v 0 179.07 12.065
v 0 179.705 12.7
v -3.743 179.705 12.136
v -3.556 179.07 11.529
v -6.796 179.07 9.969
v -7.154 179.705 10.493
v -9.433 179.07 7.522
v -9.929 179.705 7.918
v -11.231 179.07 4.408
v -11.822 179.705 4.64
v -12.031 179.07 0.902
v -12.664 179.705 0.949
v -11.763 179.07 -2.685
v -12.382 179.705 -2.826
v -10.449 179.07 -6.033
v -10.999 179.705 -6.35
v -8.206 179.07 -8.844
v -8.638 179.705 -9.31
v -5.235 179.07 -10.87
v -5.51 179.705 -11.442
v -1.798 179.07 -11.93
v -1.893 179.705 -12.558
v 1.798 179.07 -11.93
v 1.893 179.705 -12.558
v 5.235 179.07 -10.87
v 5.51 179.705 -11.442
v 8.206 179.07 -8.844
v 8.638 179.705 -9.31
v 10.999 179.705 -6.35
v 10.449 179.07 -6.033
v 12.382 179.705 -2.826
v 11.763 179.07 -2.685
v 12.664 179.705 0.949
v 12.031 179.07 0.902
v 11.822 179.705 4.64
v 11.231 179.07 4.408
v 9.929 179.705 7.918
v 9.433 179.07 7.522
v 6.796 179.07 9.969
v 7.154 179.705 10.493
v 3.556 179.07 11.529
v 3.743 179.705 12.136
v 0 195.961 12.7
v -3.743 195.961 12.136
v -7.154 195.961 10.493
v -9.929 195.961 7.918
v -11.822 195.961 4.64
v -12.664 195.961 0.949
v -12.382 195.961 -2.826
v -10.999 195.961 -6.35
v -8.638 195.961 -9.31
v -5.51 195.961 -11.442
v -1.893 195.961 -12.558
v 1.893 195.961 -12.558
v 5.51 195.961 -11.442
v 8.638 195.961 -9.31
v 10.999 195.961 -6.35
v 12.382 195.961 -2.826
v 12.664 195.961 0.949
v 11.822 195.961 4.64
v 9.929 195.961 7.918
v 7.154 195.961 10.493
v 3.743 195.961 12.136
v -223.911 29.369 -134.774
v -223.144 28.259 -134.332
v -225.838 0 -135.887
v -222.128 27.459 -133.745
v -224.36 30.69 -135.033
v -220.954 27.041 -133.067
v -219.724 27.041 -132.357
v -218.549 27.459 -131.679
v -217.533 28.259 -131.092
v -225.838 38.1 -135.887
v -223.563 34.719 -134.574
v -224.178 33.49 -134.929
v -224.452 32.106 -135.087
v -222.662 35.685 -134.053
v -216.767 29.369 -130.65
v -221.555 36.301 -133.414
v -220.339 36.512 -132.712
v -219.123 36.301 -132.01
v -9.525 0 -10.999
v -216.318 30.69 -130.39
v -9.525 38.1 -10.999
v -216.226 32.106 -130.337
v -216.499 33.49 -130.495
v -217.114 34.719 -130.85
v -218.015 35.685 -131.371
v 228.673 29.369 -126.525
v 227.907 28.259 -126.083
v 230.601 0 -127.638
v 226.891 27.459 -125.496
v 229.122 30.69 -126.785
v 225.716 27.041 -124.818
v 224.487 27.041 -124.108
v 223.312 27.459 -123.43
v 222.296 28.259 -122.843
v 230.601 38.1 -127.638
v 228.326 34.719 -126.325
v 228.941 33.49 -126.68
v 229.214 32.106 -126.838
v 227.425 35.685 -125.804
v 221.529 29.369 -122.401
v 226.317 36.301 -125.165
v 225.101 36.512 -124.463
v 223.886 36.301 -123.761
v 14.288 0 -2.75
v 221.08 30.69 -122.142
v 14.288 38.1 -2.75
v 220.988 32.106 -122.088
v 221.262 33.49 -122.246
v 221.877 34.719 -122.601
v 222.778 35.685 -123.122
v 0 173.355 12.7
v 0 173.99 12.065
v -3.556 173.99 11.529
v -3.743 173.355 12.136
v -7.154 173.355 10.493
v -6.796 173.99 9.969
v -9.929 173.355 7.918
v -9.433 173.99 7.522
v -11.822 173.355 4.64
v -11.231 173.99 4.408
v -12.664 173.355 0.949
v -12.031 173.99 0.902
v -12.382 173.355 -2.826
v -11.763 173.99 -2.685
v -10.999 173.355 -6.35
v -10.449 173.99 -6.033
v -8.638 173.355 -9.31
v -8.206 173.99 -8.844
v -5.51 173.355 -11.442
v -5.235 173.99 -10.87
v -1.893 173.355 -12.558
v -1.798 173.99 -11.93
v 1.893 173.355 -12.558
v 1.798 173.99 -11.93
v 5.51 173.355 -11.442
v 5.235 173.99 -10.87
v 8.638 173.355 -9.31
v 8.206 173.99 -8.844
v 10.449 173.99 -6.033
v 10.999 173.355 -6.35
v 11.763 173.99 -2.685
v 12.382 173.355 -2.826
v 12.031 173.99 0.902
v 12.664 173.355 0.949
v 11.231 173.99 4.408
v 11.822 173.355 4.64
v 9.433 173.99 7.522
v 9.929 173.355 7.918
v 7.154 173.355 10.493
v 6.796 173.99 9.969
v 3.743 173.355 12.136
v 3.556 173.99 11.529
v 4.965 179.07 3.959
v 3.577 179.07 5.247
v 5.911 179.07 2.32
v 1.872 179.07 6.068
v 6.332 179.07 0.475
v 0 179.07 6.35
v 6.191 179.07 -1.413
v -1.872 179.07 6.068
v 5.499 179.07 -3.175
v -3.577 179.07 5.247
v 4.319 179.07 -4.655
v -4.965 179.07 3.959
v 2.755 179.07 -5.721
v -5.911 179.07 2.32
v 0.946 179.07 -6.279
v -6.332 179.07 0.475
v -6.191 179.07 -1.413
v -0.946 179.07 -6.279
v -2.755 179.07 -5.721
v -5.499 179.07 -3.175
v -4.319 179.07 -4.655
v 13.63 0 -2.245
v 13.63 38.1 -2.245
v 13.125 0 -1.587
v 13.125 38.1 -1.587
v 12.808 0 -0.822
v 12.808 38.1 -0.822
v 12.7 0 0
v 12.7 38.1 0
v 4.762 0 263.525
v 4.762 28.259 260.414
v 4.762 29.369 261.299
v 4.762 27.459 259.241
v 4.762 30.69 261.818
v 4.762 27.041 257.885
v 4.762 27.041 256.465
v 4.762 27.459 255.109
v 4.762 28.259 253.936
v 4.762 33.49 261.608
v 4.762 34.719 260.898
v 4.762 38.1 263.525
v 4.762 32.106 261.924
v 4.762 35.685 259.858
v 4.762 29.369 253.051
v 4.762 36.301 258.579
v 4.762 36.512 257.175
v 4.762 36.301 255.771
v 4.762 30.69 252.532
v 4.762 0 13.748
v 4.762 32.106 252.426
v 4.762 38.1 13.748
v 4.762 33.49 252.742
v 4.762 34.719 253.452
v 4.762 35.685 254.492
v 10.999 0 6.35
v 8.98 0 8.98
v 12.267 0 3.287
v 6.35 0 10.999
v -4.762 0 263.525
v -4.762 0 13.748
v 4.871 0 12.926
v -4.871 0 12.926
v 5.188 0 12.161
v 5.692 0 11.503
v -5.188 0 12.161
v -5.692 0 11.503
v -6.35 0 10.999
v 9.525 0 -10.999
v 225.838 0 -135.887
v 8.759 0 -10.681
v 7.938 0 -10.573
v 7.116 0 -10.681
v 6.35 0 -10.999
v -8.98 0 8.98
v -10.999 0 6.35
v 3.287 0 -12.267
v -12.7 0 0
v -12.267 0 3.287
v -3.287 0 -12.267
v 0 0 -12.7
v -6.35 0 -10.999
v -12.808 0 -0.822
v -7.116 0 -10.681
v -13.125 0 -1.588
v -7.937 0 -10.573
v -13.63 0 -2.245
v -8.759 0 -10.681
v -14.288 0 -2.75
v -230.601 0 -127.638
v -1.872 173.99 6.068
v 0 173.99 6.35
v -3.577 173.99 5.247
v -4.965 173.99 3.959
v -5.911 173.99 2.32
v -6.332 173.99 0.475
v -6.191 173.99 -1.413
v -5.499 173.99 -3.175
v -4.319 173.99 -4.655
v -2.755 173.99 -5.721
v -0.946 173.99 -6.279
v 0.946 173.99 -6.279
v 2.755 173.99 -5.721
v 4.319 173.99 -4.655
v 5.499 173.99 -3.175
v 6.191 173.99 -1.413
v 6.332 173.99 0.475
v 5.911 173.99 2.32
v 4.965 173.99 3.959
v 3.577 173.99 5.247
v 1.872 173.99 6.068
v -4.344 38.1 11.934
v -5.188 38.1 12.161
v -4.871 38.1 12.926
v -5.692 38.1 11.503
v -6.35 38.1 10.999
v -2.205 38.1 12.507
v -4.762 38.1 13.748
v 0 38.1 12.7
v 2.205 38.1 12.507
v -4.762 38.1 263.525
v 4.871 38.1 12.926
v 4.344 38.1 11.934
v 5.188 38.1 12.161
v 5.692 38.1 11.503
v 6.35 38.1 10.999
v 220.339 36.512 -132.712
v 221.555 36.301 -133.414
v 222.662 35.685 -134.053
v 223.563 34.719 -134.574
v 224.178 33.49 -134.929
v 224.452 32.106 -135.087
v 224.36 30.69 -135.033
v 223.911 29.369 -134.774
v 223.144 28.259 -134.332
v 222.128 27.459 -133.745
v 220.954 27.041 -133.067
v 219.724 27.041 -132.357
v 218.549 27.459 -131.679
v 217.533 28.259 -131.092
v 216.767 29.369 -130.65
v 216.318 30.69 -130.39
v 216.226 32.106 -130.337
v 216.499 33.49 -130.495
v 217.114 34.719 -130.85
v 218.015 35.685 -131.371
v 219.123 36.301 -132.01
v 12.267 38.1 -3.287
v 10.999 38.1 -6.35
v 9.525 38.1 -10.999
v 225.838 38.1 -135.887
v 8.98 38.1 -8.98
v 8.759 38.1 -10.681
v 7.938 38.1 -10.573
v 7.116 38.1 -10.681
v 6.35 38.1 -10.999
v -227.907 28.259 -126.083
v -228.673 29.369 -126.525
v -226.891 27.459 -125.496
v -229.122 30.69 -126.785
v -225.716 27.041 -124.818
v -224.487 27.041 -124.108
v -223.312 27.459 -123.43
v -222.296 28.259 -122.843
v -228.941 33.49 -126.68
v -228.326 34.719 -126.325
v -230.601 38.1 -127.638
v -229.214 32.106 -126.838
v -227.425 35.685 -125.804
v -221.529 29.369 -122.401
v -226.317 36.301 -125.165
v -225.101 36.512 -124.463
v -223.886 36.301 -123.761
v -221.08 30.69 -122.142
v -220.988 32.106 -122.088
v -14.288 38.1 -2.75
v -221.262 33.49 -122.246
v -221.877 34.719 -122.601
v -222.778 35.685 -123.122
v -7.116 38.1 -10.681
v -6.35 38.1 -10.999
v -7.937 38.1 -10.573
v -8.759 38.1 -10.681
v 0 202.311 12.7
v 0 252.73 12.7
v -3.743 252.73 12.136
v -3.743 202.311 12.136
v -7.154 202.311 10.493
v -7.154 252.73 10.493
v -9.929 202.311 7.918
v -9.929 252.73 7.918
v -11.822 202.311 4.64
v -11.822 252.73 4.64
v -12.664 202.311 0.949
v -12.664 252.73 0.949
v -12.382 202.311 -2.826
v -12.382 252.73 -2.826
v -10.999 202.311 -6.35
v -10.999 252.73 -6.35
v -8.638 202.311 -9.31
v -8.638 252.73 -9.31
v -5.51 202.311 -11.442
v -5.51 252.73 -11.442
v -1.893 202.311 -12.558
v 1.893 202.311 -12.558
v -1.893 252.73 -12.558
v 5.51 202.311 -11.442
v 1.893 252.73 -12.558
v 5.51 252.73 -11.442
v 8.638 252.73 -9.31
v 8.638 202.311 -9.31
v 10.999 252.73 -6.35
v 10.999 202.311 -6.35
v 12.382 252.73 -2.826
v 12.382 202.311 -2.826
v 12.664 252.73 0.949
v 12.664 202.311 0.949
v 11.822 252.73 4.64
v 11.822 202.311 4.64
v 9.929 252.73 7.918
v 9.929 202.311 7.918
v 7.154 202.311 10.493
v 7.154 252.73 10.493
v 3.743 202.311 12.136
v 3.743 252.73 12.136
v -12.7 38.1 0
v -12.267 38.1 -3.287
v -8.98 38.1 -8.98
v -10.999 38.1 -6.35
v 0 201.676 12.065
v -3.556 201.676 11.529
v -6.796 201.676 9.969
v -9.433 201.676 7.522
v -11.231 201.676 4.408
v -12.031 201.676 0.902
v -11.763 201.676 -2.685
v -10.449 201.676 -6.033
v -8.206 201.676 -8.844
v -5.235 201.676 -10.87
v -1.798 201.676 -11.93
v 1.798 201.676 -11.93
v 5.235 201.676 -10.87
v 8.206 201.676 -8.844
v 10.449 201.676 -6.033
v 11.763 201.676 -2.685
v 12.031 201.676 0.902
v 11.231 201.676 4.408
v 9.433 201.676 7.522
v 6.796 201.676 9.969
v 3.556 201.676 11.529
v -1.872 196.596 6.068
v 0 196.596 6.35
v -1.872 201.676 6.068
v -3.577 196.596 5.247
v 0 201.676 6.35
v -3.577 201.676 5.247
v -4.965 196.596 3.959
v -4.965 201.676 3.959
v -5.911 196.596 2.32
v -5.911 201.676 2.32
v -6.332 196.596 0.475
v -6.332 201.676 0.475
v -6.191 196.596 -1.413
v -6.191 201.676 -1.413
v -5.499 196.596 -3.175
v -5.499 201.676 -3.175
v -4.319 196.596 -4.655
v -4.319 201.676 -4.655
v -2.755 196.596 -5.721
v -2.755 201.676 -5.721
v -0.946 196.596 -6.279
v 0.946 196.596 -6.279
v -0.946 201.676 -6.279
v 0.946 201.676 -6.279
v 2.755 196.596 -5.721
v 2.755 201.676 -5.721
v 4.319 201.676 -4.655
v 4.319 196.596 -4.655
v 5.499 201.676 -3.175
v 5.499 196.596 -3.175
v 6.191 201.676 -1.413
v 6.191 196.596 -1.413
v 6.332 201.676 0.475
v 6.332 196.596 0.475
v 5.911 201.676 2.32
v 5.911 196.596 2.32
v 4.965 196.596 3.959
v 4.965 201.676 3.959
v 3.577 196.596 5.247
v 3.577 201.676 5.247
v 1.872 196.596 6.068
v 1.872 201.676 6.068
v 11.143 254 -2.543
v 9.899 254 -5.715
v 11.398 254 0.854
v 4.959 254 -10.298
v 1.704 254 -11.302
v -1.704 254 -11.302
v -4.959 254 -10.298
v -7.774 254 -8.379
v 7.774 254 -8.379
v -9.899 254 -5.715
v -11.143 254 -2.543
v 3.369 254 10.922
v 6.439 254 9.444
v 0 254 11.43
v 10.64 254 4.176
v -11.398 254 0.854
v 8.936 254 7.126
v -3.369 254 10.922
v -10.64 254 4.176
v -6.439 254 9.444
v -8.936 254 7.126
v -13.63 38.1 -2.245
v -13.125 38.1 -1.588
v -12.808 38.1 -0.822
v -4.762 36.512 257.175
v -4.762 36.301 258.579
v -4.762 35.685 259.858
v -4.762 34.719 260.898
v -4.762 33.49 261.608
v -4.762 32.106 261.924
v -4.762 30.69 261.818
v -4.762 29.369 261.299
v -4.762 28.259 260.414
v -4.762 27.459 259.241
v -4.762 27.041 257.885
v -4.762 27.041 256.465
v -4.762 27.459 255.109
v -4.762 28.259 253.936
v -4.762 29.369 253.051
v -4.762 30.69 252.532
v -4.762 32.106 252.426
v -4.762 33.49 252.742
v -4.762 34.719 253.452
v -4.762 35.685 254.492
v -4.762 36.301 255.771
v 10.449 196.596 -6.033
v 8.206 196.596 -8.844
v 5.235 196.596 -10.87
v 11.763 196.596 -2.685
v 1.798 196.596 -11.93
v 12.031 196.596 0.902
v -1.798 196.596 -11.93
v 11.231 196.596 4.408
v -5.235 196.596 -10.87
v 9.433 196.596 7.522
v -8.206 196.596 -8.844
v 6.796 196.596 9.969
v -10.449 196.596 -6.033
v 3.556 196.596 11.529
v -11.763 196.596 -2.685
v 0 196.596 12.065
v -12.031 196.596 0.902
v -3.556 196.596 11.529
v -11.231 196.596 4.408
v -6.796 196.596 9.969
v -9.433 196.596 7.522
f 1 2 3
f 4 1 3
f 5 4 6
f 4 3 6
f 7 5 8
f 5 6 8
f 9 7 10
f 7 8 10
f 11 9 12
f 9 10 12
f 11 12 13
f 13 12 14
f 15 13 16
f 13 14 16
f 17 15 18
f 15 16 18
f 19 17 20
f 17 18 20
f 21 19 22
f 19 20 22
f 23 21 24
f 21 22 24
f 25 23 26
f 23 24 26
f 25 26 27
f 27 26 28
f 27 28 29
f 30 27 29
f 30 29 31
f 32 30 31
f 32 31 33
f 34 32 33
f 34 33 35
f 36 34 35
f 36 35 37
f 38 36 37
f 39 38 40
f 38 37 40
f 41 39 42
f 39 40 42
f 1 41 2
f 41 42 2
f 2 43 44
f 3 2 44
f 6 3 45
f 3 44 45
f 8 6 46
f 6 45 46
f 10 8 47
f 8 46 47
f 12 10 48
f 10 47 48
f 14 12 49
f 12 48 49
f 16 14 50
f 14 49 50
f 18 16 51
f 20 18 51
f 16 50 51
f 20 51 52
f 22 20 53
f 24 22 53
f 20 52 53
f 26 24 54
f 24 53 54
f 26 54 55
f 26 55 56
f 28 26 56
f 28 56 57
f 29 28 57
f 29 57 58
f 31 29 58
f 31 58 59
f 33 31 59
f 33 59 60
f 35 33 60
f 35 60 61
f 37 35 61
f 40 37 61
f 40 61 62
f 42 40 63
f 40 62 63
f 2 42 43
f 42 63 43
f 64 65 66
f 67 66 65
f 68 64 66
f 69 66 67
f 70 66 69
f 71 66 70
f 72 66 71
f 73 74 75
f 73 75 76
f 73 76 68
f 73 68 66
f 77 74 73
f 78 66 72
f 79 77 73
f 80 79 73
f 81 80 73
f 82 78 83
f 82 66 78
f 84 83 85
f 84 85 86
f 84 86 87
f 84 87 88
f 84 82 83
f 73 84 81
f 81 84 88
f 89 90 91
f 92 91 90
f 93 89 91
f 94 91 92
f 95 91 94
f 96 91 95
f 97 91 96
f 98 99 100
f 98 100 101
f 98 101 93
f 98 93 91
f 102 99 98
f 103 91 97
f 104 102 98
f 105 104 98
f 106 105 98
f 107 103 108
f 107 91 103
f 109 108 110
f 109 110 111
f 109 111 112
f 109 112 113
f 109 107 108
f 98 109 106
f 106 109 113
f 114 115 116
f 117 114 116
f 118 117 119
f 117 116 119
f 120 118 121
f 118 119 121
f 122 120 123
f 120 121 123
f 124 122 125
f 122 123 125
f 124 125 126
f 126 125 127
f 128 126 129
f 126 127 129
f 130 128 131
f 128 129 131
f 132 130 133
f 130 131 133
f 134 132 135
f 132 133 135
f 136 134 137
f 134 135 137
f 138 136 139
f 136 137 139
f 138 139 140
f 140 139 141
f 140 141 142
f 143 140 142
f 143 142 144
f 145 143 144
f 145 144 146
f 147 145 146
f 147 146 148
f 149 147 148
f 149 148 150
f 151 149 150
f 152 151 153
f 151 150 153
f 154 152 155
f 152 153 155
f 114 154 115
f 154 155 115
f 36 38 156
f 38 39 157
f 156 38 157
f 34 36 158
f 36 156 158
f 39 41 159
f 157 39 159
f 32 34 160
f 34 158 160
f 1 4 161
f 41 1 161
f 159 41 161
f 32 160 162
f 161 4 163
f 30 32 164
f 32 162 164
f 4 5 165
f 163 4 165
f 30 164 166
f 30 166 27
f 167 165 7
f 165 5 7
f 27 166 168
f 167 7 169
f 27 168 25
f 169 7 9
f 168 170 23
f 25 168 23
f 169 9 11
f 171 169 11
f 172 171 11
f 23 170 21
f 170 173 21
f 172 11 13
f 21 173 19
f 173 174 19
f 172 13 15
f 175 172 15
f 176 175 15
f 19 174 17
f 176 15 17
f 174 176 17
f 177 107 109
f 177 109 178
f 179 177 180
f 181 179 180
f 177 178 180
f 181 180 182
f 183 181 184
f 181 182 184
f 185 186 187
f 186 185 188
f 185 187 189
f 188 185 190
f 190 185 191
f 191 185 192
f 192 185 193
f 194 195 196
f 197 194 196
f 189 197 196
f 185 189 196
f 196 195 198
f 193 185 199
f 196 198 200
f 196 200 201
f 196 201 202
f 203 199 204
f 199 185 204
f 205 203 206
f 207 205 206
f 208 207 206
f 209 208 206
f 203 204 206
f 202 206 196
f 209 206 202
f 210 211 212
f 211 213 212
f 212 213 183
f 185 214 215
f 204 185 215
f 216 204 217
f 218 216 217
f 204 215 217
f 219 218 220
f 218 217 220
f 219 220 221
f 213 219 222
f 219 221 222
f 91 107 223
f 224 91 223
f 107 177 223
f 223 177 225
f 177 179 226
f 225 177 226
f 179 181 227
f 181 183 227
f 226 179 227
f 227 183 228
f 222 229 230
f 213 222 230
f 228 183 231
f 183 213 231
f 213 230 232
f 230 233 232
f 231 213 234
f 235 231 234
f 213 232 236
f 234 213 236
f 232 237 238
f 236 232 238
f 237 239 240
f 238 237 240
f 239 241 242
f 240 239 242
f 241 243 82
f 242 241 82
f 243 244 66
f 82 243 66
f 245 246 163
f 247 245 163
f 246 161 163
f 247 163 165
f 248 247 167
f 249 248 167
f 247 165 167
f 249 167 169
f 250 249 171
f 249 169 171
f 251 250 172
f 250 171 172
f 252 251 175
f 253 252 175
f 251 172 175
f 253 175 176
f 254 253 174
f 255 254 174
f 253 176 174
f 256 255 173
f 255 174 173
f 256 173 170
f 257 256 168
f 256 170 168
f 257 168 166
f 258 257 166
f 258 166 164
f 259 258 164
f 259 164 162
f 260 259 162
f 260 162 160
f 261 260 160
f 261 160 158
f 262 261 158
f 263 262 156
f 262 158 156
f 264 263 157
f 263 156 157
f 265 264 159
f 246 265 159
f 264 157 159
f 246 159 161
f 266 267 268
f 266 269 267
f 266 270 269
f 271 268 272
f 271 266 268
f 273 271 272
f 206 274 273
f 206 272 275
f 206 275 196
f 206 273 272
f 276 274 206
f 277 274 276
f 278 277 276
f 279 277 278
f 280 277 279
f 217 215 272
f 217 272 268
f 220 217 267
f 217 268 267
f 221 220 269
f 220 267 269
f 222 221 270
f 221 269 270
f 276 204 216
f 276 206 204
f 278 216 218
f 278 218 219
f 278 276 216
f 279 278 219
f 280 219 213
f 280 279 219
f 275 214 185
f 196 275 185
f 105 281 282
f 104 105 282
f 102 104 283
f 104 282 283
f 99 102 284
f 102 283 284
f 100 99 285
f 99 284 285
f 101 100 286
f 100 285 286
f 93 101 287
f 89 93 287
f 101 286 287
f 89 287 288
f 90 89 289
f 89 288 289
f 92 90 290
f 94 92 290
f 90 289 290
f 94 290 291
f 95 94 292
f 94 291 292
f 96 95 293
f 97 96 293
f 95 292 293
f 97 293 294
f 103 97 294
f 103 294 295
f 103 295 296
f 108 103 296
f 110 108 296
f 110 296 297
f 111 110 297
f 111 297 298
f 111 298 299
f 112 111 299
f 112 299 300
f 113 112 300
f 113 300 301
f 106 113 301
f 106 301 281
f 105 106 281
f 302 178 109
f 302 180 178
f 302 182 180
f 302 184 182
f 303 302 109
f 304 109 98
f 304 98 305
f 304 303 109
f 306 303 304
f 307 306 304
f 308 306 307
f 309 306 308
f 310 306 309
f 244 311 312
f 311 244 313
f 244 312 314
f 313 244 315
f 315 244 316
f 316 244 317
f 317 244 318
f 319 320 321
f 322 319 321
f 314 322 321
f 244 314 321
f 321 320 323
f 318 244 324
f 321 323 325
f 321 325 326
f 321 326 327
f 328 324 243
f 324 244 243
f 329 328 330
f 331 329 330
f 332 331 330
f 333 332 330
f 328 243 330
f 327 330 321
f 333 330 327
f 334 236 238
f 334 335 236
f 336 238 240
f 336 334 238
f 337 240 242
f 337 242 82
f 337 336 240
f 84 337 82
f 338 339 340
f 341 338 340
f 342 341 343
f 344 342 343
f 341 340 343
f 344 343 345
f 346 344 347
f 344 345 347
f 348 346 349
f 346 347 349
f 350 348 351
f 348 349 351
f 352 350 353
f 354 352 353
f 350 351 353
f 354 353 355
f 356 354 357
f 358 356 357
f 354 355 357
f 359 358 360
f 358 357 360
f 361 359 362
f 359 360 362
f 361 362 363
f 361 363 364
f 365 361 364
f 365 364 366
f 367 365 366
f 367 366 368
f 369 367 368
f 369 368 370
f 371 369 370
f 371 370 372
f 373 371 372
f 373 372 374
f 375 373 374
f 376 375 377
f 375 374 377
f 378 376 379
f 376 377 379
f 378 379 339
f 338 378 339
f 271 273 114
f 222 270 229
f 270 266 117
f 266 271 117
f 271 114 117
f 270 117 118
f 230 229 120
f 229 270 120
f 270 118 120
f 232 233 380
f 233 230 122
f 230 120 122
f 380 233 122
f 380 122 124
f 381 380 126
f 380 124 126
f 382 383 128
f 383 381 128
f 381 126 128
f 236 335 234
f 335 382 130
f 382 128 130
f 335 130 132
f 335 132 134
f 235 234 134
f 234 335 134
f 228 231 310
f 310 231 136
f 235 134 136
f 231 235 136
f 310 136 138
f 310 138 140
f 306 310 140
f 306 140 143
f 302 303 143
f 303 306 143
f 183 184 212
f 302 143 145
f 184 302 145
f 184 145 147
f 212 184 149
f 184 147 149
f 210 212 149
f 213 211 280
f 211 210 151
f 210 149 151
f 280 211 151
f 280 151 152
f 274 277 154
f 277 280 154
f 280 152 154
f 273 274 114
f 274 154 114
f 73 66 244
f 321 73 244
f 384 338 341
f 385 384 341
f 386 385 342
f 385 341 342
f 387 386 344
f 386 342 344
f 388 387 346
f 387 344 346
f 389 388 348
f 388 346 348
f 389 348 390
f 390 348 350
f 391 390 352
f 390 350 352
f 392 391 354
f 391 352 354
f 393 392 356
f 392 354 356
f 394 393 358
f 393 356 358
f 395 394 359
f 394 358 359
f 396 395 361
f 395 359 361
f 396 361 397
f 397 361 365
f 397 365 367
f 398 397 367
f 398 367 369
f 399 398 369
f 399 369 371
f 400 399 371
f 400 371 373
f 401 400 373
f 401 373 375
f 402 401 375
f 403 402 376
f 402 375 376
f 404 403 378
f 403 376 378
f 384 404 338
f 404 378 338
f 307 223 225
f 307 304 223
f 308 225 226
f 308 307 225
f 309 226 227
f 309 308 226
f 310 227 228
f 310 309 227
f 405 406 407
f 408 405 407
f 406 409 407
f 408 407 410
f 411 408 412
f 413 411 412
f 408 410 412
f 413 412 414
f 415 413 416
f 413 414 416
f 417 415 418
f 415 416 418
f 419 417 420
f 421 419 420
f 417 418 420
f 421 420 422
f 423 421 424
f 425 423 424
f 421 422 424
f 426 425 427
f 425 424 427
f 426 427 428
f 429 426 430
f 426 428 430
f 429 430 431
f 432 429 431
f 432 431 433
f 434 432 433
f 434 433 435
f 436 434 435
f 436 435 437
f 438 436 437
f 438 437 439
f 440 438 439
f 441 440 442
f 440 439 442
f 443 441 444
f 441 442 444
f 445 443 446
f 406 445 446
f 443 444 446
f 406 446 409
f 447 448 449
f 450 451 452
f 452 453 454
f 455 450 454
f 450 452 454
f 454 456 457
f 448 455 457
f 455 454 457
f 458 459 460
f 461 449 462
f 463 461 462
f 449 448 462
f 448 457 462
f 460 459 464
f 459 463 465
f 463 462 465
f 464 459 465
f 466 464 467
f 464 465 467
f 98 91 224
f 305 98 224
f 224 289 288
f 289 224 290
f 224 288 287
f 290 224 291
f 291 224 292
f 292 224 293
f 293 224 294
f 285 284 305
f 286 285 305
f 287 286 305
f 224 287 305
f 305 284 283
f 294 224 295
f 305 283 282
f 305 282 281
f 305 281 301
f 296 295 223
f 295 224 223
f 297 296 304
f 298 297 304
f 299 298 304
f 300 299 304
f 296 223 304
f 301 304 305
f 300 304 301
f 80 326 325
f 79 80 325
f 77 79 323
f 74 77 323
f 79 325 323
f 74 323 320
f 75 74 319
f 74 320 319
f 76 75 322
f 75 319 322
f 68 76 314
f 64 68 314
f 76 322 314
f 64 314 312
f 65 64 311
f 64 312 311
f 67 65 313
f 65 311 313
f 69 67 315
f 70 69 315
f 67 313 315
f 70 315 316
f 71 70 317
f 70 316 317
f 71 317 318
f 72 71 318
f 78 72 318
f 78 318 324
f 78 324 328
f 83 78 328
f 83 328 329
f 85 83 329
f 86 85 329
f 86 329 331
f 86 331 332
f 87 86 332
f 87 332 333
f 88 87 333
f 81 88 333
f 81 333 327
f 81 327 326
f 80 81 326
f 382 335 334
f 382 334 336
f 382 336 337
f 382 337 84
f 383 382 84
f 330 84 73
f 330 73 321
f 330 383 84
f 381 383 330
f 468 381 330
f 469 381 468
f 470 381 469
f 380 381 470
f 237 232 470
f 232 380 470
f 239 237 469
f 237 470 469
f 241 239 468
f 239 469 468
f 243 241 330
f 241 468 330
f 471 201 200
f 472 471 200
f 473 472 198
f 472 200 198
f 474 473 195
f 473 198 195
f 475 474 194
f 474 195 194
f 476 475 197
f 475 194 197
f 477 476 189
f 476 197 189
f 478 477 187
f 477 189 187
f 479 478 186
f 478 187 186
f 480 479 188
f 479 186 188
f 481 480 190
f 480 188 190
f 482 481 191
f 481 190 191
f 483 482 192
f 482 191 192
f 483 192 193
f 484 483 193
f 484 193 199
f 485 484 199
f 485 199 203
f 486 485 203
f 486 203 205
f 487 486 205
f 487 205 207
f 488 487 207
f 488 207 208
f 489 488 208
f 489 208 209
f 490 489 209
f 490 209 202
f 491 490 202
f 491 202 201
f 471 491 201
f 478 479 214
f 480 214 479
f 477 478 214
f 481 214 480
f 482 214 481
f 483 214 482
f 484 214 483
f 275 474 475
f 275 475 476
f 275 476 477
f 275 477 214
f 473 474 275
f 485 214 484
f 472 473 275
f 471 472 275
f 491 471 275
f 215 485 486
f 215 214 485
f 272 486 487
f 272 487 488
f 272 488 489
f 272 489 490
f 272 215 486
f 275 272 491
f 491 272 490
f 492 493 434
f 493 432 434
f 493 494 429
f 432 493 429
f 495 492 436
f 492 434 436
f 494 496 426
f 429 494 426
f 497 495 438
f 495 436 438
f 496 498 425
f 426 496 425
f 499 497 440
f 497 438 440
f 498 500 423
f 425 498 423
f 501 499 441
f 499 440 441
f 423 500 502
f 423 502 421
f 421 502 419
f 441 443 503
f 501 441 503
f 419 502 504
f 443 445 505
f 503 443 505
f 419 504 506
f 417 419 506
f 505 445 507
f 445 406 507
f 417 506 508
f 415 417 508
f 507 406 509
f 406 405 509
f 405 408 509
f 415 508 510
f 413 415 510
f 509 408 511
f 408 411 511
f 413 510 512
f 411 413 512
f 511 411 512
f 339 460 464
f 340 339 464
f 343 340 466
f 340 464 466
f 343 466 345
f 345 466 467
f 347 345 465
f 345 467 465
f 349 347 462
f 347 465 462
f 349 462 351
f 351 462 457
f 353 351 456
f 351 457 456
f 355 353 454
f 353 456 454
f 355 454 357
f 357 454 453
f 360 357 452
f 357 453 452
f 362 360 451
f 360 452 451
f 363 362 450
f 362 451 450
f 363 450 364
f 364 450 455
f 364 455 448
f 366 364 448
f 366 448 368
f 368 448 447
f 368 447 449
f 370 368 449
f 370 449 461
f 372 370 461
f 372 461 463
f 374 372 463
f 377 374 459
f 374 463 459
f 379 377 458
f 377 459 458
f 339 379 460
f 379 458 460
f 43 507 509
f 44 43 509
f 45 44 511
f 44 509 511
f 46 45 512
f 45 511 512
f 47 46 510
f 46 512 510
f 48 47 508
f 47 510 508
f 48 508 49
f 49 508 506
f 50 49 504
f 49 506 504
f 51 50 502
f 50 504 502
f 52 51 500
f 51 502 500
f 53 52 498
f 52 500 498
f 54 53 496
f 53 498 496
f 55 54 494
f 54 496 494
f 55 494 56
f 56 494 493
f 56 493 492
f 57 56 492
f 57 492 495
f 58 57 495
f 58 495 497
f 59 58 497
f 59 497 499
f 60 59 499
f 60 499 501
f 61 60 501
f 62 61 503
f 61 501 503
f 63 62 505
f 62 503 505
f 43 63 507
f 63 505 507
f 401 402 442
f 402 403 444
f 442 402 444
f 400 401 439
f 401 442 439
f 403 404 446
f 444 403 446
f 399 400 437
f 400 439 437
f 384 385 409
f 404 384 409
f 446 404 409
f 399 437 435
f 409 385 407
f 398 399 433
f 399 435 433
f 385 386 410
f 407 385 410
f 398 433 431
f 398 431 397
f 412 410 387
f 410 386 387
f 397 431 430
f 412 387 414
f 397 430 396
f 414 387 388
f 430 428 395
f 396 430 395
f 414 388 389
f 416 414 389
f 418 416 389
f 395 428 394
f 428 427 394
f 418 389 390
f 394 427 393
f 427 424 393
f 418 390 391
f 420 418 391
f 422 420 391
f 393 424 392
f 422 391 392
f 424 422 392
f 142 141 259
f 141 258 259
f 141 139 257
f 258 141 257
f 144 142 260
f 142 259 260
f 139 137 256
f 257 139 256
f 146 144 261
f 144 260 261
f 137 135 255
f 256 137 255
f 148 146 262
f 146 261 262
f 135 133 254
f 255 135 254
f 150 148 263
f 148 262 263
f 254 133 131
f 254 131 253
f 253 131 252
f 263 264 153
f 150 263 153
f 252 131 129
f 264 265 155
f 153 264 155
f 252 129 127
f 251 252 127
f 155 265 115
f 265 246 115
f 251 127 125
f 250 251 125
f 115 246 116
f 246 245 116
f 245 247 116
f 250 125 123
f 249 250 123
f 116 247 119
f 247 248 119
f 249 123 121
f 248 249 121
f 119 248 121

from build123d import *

# Parameters (mm, degrees)
SKETCH6_W                = 9.525
SKETCH6_H                = 38.1
BOSS_EXTRUDE2_DEPTH      = 263.525
SKETCH7_R                = 4.7625
CUT_EXTRUDE2_DEPTH       = 367.423749955
FILLET2_R                = 3.175
CIRPATTERN2_COUNT        = 3
FILLET2_OF_CIRPATTERN2_R = 3.175
CHAMFER5_SIZE            = 0.635
CHAMFER6_SIZE            = 1.27


with BuildPart() as part:
    # Sketch5 → Base-Revolve (revolve)
    with BuildSketch(Plane.XY, mode=Mode.PRIVATE) as base_revolve_sk:
        Polygon((12.7, 173.99), (6.35, 173.99), (6.35, 179.07), (12.7, 179.07), (12.7, 196.596), (6.35, 196.596), (6.35, 201.676), (12.7, 201.676), (12.7, 254), (0, 254), (0, 0), (12.7, 0), align=None)
    revolve(base_revolve_sk.sketch.rotate(Axis((0, 112.385522388, 0), (0, -1, 0)), 90), axis=Axis((0, 112.385522388, 0), (0, -1, 0)))

    # Sketch6 → Boss-Extrude2 (add)
    with BuildSketch(Plane.XY):
        with Locations((0, 19.05)):
            Rectangle(SKETCH6_W, SKETCH6_H)
    boss_extrude2 = extrude(amount=BOSS_EXTRUDE2_DEPTH)

    # Sketch7 → Cut-Extrude2 (cut, through all)
    with BuildSketch(Plane(origin=(4.7625, 0, 0), x_dir=(0, 0, -1), z_dir=(1, 0, 0))):
        with Locations(Location((-257.175, 31.75, 0), (0, 0, 90))):
            Circle(SKETCH7_R)
    cut_extrude2 = extrude(amount=-CUT_EXTRUDE2_DEPTH, mode=Mode.SUBTRACT)

    # Fillet2
    fillet2_edges = [part.edges().sort_by_distance(p)[0] for p in [
        (-4.7625, 19.05, 11.773215098),
        (4.7625, 19.05, 11.773215098),
    ]]
    fillet(fillet2_edges, radius=FILLET2_R)

    # CirPattern2: Boss-Extrude2, Cut-Extrude2 ×3 about axis
    cirpattern2_axis = Axis((0, 0, 0), (0, 1, 0))
    add([boss_extrude2.rotate(cirpattern2_axis, i * 360 / CIRPATTERN2_COUNT) for i in range(1, CIRPATTERN2_COUNT)])
    add([cut_extrude2.rotate(cirpattern2_axis, i * 360 / CIRPATTERN2_COUNT) for i in range(1, CIRPATTERN2_COUNT)], mode=Mode.SUBTRACT)

    # Fillet2 of CirPattern2
    fillet2_of_cirpattern2_edges = [part.edges().sort_by_distance(p)[0] for p in [
        (12.577153359, 19.05, -1.762161564),
        (7.814653359, 19.05, -10.011053535),
        (-7.814653359, 19.05, -10.011053535),
        (-12.577153359, 19.05, -1.762161564),
    ]]
    fillet(fillet2_of_cirpattern2_edges, radius=FILLET2_OF_CIRPATTERN2_R)

    # Chamfer5
    chamfer5_edges = [part.edges().sort_by_distance(p)[0] for p in [
        (0, 179.07, -12.7),
        (0, 196.596, -12.7),
        (0, 201.676, -12.7),
        (0, 173.99, -12.7),
    ]]
    chamfer(chamfer5_edges, length=CHAMFER5_SIZE)

    # Chamfer6
    chamfer6_edges = [part.edges().sort_by_distance(p)[0] for p in [
        (0, 254, -12.7),
    ]]
    chamfer(chamfer6_edges, length=CHAMFER6_SIZE)


solid = part.part
